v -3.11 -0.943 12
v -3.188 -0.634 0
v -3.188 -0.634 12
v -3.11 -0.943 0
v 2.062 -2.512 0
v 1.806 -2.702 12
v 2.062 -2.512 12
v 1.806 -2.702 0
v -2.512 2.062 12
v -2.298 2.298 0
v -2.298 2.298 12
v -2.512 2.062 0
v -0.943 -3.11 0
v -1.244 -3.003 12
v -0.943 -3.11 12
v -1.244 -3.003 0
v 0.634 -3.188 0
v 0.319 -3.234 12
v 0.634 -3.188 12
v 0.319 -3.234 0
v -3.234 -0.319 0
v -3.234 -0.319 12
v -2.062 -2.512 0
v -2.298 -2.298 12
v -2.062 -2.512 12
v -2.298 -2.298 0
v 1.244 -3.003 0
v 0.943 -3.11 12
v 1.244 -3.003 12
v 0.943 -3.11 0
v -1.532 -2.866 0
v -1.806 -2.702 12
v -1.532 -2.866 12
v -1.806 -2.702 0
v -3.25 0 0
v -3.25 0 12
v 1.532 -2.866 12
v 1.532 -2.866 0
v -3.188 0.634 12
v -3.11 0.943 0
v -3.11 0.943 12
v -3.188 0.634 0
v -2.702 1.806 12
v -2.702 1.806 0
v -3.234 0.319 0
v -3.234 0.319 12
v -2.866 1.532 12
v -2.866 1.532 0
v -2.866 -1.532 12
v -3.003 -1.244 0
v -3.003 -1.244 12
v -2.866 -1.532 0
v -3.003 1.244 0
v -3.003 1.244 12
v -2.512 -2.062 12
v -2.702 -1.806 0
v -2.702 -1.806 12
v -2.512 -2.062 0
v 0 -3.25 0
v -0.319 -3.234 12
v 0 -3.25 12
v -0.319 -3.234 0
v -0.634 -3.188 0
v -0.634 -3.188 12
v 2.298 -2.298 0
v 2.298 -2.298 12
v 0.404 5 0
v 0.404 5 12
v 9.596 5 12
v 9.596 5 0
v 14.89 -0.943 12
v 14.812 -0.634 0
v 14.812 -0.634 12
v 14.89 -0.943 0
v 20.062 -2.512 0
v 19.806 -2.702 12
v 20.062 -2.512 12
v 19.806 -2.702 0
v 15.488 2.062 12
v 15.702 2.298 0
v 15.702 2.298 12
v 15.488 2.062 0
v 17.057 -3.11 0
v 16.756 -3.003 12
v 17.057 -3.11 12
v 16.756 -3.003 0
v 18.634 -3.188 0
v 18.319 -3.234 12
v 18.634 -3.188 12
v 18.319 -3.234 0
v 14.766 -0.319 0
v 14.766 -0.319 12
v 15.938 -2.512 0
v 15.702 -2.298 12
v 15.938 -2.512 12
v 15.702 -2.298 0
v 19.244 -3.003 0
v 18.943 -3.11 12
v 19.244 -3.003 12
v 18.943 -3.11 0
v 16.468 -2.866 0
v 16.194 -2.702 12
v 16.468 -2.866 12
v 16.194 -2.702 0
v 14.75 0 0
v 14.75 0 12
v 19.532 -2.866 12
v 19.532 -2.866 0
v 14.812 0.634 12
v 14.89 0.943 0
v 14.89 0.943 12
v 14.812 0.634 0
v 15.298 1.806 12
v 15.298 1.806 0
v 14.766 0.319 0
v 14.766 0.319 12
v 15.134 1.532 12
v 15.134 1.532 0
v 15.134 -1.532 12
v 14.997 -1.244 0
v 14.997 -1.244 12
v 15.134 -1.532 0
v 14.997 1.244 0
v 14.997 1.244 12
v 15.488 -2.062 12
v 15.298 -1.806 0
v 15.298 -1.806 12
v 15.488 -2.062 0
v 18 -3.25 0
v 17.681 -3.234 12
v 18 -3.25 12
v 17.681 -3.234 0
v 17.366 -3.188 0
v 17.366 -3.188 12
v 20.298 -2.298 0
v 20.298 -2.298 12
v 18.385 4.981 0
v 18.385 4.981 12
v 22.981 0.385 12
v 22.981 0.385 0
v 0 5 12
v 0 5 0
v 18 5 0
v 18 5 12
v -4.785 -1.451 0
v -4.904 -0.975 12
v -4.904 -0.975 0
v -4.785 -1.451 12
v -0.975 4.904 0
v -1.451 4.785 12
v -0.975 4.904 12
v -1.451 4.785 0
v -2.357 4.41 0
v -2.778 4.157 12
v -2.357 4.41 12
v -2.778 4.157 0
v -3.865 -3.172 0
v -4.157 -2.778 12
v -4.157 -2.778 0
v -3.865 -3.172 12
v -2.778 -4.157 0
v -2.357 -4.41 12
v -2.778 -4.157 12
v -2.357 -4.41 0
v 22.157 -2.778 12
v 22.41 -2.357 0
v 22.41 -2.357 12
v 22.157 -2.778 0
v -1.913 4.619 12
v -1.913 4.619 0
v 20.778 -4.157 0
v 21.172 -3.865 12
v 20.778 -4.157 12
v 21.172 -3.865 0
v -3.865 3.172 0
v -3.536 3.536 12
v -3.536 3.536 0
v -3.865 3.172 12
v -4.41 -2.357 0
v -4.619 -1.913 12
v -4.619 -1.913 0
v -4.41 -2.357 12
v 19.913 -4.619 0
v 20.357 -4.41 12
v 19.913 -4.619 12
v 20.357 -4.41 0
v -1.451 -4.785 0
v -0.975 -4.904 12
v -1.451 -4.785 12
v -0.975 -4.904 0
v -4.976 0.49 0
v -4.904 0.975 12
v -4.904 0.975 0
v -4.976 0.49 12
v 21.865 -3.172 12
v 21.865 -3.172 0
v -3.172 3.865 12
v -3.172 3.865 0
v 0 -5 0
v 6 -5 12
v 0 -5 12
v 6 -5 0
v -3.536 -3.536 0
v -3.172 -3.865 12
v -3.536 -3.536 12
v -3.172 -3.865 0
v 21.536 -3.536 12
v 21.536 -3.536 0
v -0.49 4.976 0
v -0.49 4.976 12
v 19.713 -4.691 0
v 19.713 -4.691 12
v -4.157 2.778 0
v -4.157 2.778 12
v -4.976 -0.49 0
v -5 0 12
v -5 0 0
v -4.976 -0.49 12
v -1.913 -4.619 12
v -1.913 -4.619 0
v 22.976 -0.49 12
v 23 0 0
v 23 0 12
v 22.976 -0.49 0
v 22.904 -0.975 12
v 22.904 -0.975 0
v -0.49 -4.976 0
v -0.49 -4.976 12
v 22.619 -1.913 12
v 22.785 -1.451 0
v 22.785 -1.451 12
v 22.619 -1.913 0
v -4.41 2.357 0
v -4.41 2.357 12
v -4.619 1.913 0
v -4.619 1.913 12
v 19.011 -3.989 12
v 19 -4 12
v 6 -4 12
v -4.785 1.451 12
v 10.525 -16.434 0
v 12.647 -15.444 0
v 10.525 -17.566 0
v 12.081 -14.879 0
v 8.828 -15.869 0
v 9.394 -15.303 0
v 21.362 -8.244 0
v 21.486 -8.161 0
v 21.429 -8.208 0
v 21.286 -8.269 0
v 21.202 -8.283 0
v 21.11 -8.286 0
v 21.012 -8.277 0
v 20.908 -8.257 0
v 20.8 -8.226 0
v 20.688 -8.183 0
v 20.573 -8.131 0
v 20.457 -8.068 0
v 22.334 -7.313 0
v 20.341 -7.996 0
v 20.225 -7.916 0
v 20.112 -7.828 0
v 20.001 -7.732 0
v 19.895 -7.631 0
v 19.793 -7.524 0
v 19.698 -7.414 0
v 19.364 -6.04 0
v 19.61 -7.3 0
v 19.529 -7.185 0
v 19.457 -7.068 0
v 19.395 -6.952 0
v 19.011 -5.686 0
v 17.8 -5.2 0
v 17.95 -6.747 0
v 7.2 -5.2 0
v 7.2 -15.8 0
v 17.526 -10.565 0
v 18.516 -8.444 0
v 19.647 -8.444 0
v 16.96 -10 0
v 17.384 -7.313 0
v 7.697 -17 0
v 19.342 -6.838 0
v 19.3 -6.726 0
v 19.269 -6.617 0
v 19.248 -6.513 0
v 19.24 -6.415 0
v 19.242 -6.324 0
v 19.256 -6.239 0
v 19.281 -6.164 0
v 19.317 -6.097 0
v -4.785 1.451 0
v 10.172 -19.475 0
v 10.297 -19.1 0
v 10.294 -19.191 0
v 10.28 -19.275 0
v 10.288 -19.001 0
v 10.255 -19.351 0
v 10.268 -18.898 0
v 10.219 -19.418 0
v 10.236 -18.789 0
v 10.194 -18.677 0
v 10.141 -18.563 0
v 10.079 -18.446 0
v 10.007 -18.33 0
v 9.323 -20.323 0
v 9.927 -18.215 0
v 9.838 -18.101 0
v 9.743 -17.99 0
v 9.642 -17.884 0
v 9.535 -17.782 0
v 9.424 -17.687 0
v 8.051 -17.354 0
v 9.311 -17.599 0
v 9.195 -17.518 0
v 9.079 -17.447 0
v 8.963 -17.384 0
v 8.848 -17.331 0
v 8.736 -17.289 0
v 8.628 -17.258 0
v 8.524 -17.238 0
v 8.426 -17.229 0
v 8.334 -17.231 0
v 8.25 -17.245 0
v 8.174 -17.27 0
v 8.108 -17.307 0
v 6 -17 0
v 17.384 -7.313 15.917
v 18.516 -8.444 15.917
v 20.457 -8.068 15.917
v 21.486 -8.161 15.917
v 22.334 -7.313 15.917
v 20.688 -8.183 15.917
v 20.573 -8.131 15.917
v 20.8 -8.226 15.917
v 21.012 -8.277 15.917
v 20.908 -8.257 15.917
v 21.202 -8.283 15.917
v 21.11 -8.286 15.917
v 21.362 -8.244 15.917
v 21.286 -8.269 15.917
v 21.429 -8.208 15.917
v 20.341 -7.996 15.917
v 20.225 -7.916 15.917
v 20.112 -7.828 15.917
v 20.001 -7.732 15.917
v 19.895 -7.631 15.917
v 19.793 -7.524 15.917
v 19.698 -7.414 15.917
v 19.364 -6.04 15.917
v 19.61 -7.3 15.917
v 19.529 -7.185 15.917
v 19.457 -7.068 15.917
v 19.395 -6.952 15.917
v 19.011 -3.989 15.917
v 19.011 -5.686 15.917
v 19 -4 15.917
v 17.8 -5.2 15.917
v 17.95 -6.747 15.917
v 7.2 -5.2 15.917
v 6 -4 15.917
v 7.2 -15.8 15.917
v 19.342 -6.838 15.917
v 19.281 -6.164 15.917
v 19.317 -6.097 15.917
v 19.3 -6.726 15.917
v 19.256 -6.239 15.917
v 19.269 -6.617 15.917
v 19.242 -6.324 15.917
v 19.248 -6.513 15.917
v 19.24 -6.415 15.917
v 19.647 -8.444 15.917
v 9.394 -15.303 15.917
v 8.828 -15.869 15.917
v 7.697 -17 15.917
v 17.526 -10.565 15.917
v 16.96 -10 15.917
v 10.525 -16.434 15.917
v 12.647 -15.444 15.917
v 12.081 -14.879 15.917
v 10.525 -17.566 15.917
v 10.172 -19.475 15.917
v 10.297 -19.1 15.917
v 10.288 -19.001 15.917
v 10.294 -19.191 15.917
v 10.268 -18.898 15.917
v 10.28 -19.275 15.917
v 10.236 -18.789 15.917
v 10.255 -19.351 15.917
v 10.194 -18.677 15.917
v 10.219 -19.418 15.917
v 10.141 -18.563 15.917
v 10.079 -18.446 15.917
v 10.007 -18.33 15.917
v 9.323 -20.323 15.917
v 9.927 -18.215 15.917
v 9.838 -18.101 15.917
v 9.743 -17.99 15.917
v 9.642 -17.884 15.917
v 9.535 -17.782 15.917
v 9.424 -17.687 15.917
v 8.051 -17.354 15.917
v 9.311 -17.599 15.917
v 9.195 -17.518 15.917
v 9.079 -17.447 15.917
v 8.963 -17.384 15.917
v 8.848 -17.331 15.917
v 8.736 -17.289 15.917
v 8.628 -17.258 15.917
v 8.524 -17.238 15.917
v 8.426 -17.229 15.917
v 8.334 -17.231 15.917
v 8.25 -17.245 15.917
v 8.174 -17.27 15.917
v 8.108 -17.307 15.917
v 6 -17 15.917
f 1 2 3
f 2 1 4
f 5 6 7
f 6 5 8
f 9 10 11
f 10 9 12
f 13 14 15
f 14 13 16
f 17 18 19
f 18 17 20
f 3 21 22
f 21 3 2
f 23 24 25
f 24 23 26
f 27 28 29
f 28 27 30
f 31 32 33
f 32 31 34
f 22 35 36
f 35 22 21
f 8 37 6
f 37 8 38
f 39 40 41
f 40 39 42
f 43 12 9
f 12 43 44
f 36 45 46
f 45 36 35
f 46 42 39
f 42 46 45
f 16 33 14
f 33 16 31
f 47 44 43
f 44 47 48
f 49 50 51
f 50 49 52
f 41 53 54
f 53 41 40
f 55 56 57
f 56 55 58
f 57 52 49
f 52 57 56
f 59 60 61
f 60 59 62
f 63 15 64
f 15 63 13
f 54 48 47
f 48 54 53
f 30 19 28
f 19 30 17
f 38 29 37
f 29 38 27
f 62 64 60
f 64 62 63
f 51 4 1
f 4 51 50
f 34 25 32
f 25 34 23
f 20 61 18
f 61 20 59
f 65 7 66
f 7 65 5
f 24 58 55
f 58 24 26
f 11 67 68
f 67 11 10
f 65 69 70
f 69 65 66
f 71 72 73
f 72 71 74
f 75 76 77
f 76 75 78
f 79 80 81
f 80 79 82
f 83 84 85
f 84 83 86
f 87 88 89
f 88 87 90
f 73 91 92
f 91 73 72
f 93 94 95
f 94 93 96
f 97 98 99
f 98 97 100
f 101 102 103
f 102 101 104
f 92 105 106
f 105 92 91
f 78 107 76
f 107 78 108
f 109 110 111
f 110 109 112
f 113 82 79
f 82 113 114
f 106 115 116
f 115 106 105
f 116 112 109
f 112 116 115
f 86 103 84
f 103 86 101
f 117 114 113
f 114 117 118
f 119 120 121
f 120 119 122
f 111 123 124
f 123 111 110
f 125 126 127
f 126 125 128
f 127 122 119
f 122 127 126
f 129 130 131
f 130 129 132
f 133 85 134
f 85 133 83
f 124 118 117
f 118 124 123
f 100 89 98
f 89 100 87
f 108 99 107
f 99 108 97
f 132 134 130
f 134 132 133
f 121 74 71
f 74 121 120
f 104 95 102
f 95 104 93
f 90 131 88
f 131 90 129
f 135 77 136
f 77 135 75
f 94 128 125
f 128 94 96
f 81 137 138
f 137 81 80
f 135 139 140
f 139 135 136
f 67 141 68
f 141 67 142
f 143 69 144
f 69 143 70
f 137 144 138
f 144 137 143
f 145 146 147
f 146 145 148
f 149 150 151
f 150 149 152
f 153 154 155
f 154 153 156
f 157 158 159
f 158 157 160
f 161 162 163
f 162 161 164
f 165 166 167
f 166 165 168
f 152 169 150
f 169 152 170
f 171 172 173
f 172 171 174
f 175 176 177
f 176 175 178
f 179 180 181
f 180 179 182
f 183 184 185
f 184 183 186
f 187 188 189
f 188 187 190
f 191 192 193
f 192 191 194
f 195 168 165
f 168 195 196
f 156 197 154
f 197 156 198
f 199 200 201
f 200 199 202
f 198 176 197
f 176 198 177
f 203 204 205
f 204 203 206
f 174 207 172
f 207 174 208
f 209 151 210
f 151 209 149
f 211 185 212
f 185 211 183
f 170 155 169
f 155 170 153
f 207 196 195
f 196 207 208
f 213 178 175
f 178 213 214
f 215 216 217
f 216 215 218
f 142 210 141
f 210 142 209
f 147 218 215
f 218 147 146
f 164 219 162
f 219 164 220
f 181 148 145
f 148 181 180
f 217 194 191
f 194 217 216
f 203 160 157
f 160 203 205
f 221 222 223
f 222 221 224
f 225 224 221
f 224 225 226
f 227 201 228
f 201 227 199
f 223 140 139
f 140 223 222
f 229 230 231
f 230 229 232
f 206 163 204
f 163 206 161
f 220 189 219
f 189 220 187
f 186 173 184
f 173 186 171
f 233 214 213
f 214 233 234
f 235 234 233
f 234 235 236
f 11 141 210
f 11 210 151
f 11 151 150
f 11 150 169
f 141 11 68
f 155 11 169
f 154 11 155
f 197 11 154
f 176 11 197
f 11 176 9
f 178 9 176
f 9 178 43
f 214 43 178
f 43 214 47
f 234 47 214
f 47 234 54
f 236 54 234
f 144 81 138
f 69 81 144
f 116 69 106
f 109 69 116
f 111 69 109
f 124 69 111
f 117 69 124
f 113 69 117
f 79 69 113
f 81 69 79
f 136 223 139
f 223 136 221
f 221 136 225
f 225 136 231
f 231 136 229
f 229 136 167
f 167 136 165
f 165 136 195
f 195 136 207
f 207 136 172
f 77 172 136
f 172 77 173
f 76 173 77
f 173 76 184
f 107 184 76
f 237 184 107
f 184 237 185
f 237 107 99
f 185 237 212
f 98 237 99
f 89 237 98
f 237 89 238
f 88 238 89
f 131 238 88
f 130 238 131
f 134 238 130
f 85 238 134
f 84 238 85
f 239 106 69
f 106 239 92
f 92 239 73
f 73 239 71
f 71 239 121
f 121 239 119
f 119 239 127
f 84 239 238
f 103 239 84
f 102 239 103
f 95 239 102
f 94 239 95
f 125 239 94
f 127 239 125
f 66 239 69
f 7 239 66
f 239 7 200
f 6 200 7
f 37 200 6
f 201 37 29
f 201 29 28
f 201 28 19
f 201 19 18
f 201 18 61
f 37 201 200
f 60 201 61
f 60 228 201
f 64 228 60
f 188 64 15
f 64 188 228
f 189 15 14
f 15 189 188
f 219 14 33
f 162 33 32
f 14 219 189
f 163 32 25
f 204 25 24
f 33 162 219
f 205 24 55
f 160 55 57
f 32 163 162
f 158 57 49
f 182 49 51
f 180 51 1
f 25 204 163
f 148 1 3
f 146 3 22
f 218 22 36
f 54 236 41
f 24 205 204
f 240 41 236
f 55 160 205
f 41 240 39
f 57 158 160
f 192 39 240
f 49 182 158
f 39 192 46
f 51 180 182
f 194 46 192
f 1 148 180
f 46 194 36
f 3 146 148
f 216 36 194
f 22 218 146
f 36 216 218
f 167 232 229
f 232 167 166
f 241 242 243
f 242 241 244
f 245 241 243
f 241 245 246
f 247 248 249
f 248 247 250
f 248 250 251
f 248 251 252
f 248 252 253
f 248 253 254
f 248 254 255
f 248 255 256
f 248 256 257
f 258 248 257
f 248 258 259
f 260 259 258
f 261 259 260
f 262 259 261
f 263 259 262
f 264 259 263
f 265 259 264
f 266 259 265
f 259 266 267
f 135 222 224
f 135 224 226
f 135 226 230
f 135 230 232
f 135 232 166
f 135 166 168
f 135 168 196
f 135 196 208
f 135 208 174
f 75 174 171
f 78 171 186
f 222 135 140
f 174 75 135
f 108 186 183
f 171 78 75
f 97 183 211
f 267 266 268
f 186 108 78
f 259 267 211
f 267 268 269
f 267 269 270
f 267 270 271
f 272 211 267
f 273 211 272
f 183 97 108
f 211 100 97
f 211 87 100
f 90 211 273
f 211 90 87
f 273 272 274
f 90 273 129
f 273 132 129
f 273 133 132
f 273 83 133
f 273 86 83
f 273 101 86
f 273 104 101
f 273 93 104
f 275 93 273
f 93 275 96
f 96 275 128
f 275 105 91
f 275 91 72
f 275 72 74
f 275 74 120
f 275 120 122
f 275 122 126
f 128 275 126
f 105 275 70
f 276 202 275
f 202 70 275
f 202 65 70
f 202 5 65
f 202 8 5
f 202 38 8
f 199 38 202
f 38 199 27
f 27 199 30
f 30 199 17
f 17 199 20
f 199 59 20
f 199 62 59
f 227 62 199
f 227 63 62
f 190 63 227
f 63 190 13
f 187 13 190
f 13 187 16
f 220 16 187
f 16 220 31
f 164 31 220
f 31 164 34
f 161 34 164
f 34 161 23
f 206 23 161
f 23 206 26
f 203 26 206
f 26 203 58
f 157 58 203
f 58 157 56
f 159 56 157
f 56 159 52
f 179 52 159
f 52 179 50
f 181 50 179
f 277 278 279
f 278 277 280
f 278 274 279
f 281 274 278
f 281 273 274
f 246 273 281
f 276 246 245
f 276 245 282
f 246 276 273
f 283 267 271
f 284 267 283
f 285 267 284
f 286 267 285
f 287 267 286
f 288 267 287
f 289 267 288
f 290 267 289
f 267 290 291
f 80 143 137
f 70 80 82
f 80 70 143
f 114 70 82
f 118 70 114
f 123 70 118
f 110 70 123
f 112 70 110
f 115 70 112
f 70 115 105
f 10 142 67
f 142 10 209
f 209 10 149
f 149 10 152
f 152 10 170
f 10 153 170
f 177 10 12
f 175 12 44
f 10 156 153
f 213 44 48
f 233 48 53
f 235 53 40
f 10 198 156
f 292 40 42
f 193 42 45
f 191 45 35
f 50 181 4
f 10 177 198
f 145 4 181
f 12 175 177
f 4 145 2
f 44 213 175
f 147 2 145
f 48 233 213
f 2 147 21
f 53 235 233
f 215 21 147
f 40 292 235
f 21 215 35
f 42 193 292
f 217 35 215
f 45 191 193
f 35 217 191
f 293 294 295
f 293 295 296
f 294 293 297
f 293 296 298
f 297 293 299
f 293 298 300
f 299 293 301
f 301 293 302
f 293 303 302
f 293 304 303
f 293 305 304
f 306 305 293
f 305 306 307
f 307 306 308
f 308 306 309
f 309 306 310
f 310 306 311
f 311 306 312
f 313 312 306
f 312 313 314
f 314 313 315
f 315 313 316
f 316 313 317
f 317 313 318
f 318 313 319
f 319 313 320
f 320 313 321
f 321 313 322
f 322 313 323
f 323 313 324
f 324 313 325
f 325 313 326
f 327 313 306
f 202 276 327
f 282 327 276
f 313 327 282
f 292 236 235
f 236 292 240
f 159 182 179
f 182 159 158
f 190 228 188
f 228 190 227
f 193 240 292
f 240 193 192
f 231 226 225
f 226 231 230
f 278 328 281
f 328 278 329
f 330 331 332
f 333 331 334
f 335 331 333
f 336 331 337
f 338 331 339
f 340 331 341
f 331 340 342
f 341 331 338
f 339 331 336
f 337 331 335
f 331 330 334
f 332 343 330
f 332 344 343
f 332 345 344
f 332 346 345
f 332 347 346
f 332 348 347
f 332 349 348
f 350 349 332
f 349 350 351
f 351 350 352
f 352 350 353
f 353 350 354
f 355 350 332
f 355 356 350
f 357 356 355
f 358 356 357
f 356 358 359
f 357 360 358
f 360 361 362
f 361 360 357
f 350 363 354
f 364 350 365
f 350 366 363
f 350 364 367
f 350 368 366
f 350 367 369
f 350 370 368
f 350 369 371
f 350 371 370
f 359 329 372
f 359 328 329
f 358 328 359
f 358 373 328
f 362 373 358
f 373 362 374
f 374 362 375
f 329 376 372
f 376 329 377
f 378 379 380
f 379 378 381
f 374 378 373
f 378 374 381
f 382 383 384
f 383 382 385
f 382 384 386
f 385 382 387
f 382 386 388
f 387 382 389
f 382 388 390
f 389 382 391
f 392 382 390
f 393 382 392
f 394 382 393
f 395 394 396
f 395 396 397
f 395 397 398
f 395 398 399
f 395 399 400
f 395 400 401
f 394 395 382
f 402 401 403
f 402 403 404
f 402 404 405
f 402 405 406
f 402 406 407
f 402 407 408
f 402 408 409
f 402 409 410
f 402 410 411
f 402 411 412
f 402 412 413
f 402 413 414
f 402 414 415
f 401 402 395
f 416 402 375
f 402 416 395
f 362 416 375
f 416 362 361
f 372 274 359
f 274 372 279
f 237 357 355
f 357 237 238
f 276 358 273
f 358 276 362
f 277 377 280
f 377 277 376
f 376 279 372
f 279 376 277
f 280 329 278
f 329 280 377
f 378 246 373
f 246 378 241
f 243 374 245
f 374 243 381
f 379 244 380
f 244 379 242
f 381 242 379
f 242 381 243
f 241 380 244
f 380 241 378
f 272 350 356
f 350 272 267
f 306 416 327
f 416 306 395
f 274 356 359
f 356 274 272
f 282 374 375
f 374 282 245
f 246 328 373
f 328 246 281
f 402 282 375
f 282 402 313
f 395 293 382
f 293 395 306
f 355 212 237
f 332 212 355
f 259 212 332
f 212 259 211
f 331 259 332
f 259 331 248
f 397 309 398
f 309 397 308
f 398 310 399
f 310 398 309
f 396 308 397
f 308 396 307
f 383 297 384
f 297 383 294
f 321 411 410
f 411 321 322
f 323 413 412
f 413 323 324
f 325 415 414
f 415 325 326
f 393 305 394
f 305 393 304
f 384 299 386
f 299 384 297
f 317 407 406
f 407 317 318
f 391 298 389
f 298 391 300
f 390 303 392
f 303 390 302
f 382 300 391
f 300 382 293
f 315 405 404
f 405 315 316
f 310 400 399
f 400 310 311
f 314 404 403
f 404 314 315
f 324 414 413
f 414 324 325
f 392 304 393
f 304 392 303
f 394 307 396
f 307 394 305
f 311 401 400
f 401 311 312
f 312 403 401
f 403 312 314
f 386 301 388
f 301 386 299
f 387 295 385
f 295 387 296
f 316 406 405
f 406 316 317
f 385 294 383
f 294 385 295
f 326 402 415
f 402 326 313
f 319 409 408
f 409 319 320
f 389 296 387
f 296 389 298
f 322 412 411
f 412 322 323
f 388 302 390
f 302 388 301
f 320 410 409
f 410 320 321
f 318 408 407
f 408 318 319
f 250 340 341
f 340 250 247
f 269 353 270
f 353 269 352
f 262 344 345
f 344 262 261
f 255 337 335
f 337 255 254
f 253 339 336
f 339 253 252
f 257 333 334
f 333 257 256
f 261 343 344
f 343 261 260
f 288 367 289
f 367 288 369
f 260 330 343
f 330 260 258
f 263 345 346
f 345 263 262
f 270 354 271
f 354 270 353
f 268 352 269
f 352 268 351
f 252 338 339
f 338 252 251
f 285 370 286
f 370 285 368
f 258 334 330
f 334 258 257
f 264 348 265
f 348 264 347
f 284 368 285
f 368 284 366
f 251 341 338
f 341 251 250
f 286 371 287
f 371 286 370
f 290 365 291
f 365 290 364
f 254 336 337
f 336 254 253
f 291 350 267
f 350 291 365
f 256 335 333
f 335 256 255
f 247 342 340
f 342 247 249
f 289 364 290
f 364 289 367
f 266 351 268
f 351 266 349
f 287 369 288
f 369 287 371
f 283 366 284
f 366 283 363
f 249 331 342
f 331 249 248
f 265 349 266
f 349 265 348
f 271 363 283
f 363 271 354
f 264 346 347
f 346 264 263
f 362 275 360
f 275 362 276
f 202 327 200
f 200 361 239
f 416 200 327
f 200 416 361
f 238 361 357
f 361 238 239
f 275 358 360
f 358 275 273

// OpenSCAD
br=3.25;
bd=11.5;
t=4;
//382
//25
$fn=64;


d=382/24;

// top();
// endOne();
// endTwo();
normal();


module top() {
  l=d*11 ;
  translate([0,-13,0]) rotate([0,0,45]) clip(l,l-16,8);
  translate([0,-13,0]) cube([1.2,12,l]);
  translate([0,-1.2,0]) cube([13,1.2,l]);
  difference() {
    hull() {
      cube([4,10,6]);
      translate([0,-1,0]) cube([4,1,18]);
    }
    rotate([0,0,25]) translate([0,5,3]) rotate([0,90,0]) cylinder(r=1,h=20);
  }
  translate([0,0,l]) mirror([0,0,1]) difference() {
    hull() {
      cube([4,10,6]);
      translate([0,-1,0]) cube([4,1,18]);
    }
    rotate([0,0,25]) translate([0,5,3]) rotate([0,90,0]) cylinder(r=1,h=20);
  }
}


module normal() {
  bit(12);
  translate([6,-17,0]) rotate([0,0,45]) clip(d,d,0);
  translate([6,-17,0]) cube([1.2,12,d]);
  translate([6,-5.2,0]) cube([13,1.2,d]);
}

module endOne() {
  bit(12);
  translate([6,-17,0]) rotate([0,0,45]) clip(d,8,0);
  translate([6,-17,0]) cube([1.2,12,d]);
  translate([6,-5.2,0]) cube([13,1.2,d]);
}

module endTwo() {
  bit(12);
  translate([6,-17,0]) rotate([0,0,45]) clip(d,8,d-8);
  translate([6,-17,0]) cube([1.2,12,d]);
  translate([6,-5.2,0]) cube([13,1.2,d]);
}


module clip(w,w2,z) {
  mirror([0,1,0]) {  
    translate([2.8,0,z]) {
      cube([0.8,3.4,w2]);
      translate([0,2.8,0]) cube([3,0.8,w2]);
      translate([12.9,0,0]) mirror([1,0,0]) {
        cube([0.8,3.4,w2]);
        translate([0,2.8,0]) cube([3,0.8,w2]);
      }
    }
    translate([0,0,z]) cube([17.2,1.2,w2]);
    cube([1.2,4.7,w]);
    translate([17.2,0,0]) cube([1.2,4.7,w]);
    translate([1.2,3.2,0]) scale([1,2,1]) cylinder(r=0.75,h=w);
    translate([17.2,3.2,0]) scale([1,2,1]) cylinder(r=0.75,h=w);
  }
}

module bit(w) {
  difference() {
    hull() {
      cylinder(r=5,h=w);
      translate([bd+br*2,0,0]) cylinder(r=5,h=w);
    }
    translate([0,0,-0.1]) {
      cut(w);
      translate([bd+br*2,0,0]) cut(w);
    }
  }
}
module cut(w) {
  rotate([0,0,45]) {
    cylinder(r=br,h=w+0.2);
    translate([0,-br,0]) cube([br*4,br*2,w+0.2]);
  }
}
